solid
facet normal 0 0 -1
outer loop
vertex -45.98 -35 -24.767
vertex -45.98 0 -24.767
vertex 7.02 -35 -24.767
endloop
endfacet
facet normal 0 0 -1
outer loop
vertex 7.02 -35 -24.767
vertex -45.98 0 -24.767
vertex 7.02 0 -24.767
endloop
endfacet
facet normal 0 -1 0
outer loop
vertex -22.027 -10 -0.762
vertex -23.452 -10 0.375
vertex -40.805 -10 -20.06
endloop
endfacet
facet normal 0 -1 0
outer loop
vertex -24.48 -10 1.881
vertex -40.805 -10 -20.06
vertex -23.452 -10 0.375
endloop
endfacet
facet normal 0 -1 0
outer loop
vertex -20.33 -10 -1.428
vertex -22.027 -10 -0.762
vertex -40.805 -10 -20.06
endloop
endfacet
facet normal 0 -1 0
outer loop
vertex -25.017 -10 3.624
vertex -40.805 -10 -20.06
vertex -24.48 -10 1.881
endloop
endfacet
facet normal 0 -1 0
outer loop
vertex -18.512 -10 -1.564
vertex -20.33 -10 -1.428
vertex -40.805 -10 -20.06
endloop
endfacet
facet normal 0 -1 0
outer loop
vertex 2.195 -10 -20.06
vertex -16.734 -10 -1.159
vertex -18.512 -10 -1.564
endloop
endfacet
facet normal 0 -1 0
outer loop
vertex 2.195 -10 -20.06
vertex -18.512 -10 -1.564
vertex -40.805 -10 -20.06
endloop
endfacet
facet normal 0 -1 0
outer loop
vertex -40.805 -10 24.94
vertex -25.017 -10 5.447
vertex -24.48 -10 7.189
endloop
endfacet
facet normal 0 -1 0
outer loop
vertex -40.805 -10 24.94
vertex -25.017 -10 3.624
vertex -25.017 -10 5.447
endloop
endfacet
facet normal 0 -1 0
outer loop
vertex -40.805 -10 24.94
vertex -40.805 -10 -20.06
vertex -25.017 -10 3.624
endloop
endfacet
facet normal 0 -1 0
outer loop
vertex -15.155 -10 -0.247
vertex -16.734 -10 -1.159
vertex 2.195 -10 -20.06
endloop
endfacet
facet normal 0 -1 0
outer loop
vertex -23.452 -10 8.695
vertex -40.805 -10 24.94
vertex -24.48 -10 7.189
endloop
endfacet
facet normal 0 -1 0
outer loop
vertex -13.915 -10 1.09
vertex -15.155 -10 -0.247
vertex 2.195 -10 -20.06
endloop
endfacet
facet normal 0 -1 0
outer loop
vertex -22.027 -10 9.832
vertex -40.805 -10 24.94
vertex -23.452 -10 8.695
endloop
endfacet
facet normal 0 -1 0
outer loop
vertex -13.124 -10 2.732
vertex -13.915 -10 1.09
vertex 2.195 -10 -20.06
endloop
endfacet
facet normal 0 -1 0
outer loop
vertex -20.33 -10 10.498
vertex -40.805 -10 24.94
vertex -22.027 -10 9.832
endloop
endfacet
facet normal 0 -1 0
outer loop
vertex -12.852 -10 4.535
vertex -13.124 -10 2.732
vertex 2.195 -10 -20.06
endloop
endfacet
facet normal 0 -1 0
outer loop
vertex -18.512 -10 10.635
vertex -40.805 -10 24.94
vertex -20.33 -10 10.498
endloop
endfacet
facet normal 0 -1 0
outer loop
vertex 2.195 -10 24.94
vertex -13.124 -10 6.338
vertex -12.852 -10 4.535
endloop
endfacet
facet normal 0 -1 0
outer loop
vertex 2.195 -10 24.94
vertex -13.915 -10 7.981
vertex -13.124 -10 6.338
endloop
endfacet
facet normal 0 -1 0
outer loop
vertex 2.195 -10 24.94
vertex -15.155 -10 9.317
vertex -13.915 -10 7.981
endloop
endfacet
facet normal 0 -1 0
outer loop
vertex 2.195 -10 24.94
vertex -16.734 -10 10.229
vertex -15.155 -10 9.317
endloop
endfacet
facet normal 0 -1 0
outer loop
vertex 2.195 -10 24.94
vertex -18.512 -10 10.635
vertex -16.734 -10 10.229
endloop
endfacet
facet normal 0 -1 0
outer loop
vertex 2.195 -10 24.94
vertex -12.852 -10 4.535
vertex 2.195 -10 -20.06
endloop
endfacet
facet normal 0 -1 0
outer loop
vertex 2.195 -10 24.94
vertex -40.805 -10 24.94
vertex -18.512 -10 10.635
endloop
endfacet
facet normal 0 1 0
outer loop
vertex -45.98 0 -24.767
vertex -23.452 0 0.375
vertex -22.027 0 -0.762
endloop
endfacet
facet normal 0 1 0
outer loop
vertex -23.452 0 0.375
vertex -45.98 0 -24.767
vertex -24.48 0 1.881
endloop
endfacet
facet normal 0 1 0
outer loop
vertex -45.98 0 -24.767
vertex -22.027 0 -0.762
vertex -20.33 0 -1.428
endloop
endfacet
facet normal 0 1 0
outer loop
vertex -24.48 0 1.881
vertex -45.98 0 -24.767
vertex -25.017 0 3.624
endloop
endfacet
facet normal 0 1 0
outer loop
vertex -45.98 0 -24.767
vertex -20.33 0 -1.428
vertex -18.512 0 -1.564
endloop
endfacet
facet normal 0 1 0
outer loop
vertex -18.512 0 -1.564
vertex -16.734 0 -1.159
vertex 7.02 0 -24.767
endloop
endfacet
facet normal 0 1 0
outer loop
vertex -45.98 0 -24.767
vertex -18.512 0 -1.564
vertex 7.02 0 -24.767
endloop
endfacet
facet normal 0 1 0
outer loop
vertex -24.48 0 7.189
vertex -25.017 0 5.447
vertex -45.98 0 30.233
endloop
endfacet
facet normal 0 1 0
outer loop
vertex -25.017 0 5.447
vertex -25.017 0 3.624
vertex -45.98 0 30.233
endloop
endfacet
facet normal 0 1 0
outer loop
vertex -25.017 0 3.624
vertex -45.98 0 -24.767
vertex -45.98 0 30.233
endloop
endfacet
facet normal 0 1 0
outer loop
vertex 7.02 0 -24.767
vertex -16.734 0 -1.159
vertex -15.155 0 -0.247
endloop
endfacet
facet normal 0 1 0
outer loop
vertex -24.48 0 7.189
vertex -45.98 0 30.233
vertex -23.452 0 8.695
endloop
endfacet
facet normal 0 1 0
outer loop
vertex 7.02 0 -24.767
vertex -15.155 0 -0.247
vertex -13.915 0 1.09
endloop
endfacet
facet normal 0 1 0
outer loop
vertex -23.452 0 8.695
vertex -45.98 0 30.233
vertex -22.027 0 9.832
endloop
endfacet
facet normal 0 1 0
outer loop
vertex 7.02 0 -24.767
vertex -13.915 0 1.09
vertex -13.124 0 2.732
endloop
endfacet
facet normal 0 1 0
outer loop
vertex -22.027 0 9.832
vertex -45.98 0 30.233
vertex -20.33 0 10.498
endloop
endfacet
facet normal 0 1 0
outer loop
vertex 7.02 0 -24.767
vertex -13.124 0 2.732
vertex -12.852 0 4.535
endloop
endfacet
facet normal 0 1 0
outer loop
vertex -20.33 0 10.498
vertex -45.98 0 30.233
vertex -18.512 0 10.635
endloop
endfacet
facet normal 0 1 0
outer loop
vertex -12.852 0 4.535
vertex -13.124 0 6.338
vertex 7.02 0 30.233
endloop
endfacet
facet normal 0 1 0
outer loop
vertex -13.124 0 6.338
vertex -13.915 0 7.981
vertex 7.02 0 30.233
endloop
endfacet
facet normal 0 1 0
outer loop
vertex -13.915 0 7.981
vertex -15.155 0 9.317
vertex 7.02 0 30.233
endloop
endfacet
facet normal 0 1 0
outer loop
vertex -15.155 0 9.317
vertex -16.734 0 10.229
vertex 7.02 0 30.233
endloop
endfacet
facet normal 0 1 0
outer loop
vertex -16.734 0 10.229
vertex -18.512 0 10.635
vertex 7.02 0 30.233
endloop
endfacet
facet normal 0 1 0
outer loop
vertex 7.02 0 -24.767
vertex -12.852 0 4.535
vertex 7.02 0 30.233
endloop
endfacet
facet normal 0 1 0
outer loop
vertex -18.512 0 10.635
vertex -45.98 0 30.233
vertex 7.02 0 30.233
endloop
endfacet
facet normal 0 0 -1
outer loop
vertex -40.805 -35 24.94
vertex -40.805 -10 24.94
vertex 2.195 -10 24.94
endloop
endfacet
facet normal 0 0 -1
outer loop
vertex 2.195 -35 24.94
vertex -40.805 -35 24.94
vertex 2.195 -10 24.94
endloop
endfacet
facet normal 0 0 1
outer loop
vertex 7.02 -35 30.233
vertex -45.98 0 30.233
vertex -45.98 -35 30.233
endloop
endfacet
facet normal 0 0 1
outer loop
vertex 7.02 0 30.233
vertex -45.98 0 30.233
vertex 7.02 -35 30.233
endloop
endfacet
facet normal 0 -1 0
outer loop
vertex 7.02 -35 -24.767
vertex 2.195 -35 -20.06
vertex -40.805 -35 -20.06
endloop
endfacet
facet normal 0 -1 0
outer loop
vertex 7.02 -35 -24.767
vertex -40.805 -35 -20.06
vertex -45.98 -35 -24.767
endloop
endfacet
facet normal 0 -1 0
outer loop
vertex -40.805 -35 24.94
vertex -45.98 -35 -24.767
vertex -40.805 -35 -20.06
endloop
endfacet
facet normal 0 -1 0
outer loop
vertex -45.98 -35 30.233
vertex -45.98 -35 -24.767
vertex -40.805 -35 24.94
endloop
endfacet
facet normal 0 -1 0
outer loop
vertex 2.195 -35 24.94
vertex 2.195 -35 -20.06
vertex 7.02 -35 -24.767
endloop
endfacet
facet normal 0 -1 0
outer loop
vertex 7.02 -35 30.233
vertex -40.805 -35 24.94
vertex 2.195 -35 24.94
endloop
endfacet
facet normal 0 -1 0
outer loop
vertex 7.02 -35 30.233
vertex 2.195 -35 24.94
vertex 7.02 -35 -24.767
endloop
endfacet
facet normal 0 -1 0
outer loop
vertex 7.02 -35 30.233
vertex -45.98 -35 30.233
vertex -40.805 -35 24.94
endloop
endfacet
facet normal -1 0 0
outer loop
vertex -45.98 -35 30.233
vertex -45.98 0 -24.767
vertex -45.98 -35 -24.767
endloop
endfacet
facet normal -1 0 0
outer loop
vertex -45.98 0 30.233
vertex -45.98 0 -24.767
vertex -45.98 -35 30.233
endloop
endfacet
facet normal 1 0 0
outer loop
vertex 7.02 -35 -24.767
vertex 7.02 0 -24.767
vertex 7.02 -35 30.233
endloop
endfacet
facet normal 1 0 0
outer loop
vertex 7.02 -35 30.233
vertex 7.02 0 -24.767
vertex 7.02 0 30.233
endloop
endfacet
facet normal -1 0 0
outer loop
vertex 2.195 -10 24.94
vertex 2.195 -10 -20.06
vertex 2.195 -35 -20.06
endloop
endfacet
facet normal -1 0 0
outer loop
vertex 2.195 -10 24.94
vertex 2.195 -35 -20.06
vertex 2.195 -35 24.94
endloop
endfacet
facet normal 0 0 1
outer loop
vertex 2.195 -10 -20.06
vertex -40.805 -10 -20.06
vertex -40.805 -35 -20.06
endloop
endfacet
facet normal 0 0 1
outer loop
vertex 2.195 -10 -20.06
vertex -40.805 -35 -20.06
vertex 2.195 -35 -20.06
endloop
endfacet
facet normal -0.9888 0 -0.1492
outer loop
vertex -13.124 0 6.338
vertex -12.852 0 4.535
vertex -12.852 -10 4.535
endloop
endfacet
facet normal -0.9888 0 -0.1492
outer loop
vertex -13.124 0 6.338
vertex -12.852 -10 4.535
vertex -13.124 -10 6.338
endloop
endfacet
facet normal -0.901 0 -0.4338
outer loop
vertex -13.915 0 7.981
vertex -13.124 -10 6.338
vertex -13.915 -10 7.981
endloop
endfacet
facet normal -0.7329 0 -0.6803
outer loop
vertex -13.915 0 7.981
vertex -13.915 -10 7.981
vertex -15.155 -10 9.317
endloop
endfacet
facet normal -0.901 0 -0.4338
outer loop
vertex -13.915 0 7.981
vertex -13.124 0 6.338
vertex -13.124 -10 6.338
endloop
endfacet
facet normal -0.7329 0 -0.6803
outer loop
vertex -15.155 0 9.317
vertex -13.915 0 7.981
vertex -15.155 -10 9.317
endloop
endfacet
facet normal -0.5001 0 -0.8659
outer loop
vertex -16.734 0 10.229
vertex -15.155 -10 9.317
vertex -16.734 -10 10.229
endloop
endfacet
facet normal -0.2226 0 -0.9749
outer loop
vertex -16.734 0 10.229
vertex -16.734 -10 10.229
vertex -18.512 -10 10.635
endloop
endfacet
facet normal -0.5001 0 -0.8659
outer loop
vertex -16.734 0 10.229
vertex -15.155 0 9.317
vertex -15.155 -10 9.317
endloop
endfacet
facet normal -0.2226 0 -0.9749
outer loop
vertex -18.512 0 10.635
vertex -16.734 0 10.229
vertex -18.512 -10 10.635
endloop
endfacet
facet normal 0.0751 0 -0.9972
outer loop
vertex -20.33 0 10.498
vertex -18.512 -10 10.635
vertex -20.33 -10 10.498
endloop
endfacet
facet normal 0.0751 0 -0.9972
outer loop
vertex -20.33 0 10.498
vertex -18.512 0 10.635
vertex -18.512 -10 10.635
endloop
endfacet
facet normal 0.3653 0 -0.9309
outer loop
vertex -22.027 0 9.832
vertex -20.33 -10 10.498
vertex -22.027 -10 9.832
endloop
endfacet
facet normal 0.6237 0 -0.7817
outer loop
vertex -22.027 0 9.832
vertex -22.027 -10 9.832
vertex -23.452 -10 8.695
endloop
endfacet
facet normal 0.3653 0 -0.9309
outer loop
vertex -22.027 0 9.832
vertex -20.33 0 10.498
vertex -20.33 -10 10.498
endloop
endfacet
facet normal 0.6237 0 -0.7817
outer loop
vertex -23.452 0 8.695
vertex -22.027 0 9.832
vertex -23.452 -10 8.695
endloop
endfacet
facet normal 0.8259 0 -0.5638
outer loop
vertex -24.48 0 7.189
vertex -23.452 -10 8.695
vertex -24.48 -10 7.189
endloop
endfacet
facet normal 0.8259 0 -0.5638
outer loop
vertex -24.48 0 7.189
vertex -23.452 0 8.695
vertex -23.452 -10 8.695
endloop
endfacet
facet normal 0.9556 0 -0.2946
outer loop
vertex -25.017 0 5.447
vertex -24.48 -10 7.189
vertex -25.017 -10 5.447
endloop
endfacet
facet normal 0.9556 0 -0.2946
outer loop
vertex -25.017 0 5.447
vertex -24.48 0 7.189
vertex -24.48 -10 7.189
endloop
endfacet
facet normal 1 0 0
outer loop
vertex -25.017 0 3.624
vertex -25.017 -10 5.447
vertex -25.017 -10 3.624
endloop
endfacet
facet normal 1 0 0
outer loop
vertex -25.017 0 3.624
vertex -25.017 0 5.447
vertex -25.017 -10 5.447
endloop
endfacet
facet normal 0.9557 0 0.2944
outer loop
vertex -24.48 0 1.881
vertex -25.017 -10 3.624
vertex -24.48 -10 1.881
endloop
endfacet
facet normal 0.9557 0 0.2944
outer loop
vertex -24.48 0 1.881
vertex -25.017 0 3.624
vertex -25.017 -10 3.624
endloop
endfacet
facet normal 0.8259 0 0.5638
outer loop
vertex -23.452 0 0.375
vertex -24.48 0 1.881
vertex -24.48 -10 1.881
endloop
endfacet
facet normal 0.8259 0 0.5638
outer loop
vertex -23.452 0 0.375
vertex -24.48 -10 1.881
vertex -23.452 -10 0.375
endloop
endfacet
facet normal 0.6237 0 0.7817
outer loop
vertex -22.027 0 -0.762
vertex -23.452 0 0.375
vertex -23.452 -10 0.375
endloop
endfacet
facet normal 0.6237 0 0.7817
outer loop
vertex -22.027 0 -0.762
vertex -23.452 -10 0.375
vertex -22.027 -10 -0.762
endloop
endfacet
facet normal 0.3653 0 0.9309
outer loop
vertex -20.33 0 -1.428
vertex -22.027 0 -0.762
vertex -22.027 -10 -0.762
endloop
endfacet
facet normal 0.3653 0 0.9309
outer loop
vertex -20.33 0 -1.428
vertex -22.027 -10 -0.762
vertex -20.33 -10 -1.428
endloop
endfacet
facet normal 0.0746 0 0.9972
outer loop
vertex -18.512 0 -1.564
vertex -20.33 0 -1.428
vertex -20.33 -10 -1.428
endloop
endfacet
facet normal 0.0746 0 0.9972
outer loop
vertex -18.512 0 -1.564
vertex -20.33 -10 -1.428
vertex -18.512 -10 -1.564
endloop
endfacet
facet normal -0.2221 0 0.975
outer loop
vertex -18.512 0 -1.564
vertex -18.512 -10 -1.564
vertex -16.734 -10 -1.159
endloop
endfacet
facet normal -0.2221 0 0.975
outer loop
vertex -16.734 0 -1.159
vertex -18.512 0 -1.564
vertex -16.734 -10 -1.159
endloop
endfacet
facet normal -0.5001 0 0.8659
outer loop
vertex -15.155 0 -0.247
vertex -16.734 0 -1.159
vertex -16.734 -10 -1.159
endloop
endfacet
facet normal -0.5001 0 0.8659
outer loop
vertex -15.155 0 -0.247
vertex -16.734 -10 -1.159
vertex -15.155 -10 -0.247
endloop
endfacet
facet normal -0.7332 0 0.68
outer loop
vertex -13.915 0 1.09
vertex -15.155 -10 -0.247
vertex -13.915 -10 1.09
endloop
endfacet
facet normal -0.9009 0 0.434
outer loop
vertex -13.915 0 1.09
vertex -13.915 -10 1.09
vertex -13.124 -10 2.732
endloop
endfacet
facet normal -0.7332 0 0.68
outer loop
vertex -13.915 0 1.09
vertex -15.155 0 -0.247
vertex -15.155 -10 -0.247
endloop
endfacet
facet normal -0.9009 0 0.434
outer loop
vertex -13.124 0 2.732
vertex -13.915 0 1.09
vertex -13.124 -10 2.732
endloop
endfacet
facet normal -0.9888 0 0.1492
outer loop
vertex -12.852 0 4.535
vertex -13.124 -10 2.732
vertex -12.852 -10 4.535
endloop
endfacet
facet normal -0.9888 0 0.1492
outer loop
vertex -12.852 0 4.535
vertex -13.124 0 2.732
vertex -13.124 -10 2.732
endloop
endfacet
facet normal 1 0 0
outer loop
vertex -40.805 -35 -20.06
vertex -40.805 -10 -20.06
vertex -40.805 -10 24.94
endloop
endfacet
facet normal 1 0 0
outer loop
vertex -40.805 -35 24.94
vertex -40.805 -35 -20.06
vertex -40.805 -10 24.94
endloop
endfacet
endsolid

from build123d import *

# Parameters (mm, degrees)
F1_W     = 53
F1_H     = 55
F1_W_2   = 43
F1_H_2   = 45
F2_DEPTH = 35
F1_R     = 6.116576
F3_DEPTH = 10


with BuildPart() as f2:
    # F1 (on face) → F2 (new body)
    with BuildSketch(Plane.XZ):
        with Locations((-19.479784, 2.733284)):
            Rectangle(F1_W, F1_H)
        with Locations((-19.305006, 2.440175)):
            Rectangle(F1_W_2, F1_H_2, mode=Mode.SUBTRACT)
    extrude(amount=F2_DEPTH)

    # F1 (on face) → F3 (join)
    with BuildSketch(Plane.XZ):
        with Locations((-19.305006, 2.440175)):
            Rectangle(F1_W_2, F1_H_2)
        with Locations((-18.968696, 4.535152)):
            Circle(F1_R, mode=Mode.SUBTRACT)
    extrude(amount=F3_DEPTH)


solid = f2.part
